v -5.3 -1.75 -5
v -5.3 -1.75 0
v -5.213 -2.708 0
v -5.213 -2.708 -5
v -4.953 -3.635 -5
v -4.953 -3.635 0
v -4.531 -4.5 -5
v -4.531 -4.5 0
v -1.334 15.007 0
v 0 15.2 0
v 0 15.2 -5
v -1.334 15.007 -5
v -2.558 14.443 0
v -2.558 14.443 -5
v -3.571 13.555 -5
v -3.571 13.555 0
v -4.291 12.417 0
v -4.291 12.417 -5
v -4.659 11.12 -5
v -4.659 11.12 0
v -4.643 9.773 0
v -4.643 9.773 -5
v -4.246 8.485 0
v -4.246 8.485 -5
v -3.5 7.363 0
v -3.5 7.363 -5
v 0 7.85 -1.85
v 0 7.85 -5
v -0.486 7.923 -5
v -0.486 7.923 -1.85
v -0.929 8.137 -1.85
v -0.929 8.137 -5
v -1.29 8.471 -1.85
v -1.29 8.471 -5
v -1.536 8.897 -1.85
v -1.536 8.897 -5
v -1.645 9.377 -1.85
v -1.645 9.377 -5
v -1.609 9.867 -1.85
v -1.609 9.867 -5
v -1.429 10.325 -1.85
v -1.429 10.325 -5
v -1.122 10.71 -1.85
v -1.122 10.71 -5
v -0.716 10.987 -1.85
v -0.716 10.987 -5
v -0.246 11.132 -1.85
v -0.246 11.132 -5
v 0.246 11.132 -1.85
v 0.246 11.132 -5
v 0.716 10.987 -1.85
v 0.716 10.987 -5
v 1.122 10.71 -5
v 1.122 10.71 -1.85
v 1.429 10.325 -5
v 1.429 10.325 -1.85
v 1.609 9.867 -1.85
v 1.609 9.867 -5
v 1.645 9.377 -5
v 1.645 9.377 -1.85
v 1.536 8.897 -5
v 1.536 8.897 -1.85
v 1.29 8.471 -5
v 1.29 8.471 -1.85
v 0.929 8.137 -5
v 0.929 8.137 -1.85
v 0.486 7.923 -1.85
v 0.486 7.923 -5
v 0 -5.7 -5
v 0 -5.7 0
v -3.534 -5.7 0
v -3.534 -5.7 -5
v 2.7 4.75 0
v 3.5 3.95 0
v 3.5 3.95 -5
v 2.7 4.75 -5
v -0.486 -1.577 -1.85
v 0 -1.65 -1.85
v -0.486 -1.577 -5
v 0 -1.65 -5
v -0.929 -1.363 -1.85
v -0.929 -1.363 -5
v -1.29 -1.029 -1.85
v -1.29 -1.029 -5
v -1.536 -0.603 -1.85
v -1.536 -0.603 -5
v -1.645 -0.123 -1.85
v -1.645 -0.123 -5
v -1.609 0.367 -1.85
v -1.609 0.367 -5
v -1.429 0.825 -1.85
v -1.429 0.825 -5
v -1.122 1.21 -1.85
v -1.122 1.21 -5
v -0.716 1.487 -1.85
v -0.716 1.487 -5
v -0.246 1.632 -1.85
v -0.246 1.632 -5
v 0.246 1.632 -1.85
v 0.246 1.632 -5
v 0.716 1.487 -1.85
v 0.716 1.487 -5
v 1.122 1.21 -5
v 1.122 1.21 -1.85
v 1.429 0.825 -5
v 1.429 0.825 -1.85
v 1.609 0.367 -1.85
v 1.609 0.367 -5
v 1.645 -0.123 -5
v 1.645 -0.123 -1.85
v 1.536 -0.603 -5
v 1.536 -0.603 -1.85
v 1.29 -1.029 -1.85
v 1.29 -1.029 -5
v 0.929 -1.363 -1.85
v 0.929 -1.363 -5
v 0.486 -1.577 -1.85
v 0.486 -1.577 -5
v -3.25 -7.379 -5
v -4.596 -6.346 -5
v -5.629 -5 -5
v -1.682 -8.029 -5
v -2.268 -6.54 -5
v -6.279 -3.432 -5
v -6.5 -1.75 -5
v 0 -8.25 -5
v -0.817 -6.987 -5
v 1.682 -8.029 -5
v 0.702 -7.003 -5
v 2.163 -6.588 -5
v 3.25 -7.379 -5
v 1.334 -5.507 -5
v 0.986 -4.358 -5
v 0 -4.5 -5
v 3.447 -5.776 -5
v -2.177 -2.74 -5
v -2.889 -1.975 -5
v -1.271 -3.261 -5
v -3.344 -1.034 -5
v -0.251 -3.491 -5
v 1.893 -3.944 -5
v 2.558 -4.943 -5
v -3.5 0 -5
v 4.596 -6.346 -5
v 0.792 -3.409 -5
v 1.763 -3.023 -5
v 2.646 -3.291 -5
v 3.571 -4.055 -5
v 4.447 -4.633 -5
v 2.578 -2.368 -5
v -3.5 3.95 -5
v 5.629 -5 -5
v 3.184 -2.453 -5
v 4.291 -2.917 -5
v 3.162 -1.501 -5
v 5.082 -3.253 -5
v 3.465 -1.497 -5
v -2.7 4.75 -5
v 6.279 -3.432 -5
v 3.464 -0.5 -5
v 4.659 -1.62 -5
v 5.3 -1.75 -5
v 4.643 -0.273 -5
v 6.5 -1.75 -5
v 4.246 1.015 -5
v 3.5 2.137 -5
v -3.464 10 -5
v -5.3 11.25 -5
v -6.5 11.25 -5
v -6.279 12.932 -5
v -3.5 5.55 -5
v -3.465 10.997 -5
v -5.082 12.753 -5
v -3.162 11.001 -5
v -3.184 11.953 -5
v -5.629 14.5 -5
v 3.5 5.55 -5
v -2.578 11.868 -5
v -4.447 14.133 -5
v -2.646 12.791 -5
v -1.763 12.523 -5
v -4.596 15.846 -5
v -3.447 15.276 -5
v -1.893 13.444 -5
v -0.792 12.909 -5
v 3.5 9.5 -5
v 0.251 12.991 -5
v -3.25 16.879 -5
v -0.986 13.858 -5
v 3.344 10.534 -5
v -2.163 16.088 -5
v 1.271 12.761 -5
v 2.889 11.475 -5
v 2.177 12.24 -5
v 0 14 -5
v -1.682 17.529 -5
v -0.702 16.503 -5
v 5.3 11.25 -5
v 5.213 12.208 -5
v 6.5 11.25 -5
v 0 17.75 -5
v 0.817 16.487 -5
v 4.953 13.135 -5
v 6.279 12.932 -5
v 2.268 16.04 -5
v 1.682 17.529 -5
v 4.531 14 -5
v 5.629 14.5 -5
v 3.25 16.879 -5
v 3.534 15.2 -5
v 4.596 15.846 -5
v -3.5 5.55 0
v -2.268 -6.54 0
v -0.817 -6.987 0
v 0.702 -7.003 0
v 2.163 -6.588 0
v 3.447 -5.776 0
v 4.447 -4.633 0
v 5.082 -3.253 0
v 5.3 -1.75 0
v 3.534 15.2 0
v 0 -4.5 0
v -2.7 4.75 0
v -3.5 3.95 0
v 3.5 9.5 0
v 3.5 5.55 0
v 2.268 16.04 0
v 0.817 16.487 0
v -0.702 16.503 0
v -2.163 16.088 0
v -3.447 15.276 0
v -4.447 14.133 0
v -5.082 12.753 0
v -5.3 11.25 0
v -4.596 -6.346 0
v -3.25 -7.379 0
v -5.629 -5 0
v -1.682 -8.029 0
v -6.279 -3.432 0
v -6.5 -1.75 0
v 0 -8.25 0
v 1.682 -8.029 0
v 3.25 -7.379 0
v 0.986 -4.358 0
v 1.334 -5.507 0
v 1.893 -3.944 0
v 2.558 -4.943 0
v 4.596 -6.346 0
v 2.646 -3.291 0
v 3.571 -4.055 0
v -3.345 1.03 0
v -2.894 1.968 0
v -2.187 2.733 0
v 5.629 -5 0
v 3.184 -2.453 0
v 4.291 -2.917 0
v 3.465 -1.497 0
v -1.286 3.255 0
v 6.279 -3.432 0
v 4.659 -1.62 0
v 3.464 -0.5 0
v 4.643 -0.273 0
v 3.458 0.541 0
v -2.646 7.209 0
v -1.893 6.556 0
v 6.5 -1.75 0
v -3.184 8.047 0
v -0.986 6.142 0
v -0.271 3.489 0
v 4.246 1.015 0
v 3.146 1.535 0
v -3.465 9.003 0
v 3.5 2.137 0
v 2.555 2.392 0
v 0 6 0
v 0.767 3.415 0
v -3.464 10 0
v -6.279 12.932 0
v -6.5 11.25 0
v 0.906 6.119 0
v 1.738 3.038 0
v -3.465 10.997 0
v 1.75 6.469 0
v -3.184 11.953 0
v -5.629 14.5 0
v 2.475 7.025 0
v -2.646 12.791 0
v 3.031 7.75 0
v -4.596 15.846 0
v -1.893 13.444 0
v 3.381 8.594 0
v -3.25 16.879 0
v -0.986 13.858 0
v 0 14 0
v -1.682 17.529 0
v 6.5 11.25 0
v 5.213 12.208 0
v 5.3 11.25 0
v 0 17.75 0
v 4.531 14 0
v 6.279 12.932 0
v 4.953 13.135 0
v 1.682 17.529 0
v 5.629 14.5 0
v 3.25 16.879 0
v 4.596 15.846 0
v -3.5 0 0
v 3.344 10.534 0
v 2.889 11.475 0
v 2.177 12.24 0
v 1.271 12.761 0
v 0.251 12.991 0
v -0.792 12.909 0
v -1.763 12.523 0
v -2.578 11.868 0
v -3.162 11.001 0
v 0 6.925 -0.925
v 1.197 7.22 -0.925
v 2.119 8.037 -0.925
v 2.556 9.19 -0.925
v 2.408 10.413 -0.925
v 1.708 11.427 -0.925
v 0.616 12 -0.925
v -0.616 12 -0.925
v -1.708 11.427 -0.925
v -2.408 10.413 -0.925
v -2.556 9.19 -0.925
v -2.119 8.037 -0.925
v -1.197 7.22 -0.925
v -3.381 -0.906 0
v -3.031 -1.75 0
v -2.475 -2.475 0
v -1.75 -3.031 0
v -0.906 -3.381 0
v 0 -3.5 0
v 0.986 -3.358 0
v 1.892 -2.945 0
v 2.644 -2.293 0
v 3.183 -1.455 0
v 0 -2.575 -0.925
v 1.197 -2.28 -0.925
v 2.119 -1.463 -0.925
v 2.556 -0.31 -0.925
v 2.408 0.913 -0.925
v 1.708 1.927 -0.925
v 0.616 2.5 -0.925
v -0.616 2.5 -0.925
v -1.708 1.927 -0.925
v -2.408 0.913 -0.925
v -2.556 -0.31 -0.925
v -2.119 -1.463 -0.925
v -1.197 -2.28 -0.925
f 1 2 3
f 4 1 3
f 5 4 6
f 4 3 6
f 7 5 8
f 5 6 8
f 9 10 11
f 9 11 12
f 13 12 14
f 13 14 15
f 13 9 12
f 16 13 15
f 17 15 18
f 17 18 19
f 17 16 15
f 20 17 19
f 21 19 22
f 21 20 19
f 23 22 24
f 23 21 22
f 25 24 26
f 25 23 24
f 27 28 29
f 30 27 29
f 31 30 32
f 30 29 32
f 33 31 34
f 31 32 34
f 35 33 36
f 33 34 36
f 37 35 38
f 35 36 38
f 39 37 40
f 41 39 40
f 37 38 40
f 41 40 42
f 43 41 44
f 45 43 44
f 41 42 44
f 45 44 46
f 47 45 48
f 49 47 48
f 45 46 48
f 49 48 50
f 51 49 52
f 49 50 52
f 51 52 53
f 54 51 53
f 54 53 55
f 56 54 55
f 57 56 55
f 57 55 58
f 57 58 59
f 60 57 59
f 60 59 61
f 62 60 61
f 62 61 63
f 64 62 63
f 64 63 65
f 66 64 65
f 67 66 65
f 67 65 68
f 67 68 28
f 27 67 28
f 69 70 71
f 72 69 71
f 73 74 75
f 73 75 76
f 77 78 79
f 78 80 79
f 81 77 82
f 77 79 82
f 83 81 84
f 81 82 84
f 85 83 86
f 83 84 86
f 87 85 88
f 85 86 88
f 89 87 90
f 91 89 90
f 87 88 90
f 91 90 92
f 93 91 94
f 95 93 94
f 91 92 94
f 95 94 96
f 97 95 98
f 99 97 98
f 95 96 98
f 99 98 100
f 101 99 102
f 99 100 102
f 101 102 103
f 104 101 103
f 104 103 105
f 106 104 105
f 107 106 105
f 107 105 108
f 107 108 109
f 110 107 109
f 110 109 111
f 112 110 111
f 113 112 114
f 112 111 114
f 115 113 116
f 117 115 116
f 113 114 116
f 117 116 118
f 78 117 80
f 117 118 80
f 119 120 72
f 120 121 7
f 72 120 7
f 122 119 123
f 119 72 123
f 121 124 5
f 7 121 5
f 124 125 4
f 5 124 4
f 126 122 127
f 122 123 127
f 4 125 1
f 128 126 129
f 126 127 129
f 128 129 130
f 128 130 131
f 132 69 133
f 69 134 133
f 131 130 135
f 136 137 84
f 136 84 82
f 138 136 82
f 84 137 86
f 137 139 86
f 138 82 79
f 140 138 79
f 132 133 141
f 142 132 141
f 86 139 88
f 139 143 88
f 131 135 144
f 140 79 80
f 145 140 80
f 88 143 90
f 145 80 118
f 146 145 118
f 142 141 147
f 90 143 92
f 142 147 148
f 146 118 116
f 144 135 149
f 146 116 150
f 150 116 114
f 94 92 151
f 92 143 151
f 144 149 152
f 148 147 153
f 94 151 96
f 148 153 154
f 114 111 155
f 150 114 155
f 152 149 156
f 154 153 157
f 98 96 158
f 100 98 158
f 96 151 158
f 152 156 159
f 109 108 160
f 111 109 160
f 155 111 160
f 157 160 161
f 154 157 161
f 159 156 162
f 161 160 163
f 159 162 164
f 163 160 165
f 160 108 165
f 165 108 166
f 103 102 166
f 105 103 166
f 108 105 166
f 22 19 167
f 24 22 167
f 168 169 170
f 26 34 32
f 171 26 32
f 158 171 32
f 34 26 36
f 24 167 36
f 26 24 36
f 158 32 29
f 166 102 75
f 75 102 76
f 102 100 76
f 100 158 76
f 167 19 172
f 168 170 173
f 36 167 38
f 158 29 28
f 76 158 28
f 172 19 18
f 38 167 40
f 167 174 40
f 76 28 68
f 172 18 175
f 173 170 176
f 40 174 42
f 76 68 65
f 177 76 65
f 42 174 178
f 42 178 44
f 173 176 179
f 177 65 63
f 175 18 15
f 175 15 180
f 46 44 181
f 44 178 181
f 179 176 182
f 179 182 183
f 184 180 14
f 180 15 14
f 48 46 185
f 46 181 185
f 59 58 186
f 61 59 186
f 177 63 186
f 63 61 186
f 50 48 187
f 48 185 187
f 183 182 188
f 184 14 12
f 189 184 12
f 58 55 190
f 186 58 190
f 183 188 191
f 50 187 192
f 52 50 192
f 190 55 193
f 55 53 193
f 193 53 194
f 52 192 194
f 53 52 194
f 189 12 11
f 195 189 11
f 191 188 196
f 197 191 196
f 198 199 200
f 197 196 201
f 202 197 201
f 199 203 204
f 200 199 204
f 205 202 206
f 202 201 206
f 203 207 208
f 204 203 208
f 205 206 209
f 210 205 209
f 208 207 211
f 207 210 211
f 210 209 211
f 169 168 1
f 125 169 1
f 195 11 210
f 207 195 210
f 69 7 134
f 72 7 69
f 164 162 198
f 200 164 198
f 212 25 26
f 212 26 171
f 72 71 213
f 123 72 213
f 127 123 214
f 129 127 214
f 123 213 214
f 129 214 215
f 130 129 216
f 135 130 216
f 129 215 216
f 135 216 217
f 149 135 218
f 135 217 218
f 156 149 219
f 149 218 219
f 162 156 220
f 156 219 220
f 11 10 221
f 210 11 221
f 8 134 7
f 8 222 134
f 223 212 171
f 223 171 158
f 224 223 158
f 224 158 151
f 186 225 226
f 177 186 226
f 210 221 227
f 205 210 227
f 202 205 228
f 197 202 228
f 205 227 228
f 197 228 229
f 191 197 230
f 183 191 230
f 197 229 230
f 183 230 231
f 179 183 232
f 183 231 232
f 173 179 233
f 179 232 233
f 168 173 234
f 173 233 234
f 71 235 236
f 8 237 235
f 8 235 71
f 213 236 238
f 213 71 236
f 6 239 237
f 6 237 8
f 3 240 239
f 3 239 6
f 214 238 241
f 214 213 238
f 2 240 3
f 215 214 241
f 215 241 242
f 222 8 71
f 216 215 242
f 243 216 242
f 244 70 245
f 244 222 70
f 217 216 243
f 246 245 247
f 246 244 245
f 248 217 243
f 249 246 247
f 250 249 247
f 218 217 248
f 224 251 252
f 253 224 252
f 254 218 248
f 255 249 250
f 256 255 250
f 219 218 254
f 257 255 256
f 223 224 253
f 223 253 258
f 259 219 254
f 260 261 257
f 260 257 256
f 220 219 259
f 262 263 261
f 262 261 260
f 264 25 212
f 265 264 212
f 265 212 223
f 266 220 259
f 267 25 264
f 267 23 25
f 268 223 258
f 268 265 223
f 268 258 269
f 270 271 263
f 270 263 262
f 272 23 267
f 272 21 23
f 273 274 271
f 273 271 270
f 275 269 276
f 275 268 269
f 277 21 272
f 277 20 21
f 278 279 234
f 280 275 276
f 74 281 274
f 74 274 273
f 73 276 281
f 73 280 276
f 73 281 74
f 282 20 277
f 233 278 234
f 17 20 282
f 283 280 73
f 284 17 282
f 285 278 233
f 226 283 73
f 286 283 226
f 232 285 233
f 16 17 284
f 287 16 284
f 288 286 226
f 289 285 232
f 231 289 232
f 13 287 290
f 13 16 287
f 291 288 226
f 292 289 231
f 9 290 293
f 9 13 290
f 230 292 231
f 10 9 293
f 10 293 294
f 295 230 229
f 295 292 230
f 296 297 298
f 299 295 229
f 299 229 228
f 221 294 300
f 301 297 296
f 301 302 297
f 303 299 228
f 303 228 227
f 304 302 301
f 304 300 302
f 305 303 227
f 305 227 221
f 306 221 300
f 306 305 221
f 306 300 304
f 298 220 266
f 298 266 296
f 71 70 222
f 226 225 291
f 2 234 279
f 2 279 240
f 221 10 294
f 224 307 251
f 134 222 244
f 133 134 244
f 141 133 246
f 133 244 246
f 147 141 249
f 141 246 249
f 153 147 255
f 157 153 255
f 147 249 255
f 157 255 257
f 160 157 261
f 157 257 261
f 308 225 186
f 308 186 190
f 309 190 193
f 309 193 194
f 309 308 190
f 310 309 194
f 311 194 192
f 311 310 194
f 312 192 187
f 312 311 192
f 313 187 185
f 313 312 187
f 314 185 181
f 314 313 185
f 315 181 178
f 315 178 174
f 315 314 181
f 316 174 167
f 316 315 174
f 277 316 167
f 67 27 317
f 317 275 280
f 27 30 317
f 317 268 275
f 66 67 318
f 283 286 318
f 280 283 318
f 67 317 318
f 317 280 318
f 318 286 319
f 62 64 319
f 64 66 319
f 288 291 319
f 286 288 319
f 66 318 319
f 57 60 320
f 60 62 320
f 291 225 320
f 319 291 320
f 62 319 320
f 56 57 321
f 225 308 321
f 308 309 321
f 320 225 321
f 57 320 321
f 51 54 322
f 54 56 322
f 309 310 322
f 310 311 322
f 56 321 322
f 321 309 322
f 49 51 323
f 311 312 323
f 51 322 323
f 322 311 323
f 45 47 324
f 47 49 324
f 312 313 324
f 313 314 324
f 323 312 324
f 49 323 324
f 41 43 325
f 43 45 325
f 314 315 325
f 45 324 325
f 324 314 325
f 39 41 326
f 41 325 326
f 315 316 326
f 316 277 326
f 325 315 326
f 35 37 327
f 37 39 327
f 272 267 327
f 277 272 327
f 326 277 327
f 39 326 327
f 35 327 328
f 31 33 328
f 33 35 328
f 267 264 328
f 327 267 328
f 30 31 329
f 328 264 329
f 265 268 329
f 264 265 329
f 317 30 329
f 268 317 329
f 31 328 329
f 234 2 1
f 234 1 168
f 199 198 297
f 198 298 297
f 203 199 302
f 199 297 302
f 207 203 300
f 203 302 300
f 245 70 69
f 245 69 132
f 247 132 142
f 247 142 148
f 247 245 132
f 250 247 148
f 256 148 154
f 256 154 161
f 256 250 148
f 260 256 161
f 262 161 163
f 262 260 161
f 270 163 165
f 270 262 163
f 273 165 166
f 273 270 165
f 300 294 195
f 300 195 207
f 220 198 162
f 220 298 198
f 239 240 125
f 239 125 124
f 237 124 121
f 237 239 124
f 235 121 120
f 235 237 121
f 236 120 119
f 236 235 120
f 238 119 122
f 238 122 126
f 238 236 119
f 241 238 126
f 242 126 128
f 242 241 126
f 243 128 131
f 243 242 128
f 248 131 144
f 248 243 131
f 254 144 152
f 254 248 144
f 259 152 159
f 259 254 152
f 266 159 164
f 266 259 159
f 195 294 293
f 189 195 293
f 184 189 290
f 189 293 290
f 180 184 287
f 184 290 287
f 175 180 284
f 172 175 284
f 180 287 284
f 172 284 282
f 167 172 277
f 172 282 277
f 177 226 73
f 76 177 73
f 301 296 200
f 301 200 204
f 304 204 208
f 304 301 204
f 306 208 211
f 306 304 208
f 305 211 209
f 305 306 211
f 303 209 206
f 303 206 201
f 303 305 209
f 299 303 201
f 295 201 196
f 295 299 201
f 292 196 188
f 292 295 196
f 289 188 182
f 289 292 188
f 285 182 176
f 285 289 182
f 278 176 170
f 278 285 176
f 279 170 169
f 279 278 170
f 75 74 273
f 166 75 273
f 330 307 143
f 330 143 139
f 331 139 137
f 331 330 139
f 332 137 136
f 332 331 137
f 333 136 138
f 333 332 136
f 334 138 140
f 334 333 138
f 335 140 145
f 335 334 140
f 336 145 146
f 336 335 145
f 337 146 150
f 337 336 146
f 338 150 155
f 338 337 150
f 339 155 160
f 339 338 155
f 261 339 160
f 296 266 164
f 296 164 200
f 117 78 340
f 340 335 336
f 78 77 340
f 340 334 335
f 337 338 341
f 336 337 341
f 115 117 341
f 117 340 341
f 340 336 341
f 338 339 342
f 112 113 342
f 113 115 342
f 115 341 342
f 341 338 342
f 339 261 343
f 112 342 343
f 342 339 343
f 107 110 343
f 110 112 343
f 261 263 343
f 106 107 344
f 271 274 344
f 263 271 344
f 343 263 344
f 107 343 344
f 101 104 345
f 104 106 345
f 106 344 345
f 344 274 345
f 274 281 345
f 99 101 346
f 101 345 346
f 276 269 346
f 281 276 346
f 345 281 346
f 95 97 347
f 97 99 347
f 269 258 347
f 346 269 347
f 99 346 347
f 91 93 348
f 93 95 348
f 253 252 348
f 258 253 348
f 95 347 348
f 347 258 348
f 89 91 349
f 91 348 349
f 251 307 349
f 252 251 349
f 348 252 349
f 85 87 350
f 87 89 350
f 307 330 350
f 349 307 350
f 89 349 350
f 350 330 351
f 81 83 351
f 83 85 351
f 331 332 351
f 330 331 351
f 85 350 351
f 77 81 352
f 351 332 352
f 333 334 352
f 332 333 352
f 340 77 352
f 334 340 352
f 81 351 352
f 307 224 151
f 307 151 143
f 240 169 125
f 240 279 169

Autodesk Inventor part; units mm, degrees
ref_plane "YZ Plane" through (0, 0, 0) normal (1, 0, 0) x (0, 1, 0)
ref_plane "XZ Plane" through (0, 0, 0) normal (0, 1, 0) x (-1, 0, 0)
ref_plane "XY Plane" through (0, 0, 0) normal (0, 0, 1) x (1, 0, 0)
sketch "Skizze1" plane through (0, 0, 0) normal (0, 0, 1) x (1, 0, 0)
  line L0 (0, -1.75) -> (0, 11.25) construction
  line L1 (6.5, -1.75) -> (6.5, 11.25)
  line L2 (-6.5, 11.25) -> (-6.5, -1.75)
  arc A0 (-6.5, -1.75) -> (6.5, -1.75) centre (0, -1.75) ccw
  arc A1 (6.5, 11.25) -> (-6.5, 11.25) centre (0, 11.25) ccw
  line L3 (0, 0) -> (0, 9.5) construction
  line L4 (5, -11) -> (-5, -11) construction
  line L5 (0, 0) -> (0, -11) construction
  line L6 (-8.5, 9.1711) -> (-8.5, -11) construction
  point P0 (0, 4.75)
  dimension "d0" = 13
  dimension "d1" = 13
  dimension "d14" = 9.5
  dimension "d17" = 0
  dimension "d26" = 11
  dimension "d27" = 10
  dimension "d28" = 9.25
  dimension "d29" = 8.5
  dimension "d30" = 8.5
extrude "Extrusion1" add sketch "Skizze1" against normal blind 5
hole "Bohrung2" at (0, 9.5, 0) at (0, 0, 0) direction (0, 0, -1) diameter 3.3 end through all countersink diameter 7 countersink angle 90
sketch "Skizze5" plane through (0, 0, 0) normal (0, 0, 1) x (1, 0, 0)
  circle A0 centre (0, 9.5) radius 3.5 projected
  circle A1 centre (0, 0) radius 3.5 projected
  line L0 (6.5, -1.75) -> (6.5, 11.25) projected
  arc A2 (6.5, 11.25) -> (-6.5, 11.25) centre (0, 11.25) ccw projected
  line L1 (-6.5, 11.25) -> (-6.5, -1.75) projected
  arc A3 (-6.5, -1.75) -> (6.5, -1.75) centre (0, -1.75) ccw projected
  arc A4 (5.3, 11.25) -> (-5.3, 11.25) centre (0, 11.25) ccw
  line L2 (5.3, 11.25) -> (5.3, -1.75)
  arc A5 (-5.3, -1.75) -> (5.3, -1.75) centre (0, -1.75) ccw
  line L3 (-5.3, -1.75) -> (-5.3, 11.25)
  arc A6 (0, 14) -> (-3.4641, 10) centre (0, 10.5) ccw
  arc A7 (0, 15.2) -> (-3.5, 7.3631) centre (0, 10.5) ccw
  line L4 (-3.5, 9.5) -> (-3.5, 0)
  line L5 (3.5, 9.5) -> (3.5, 0)
  circle A8 centre (0, 9.5) radius 3.5 projected
  circle A9 centre (0, 0) radius 3.5 projected
  line L6 (0, 23.6739) -> (0, -14.1739) construction
  arc A10 (0, -5.7) -> (3.5, 2.1369) centre (0, -1) ccw
  line L7 (0, -4.5) -> (-4.5307, -4.5)
  line L8 (0, -5.7) -> (-3.5338, -5.7)
  line L9 (0, 15.2) -> (3.5338, 15.2)
  line L10 (0, 14) -> (4.5307, 14)
  arc A11 (0, -4.5) -> (3.4641, -0.5) centre (0, -1) ccw
  point P0 (3.5, 2.6665)
  dimension "d47" = 1.2
  dimension "d48" = 1.2
  dimension "d50" = 1
  dimension "d60" = 3.5
  dimension "d61" = 1
  dimension "d62" = 1.2
  dimension "d63" = 3.5
extrude "Extrusion4" cut sketch "Skizze5" against normal through all contours A0 A6 L10 A4 L2 A5 L8 A10 L5 | L4 A1 A11 L7 A5 L3 A4 L9 A7
sketch "Skizze6" plane through (0, 0, 0) normal (0, 0, 1) x (1, 0, 0)
  line L0 (-3.5, 7.3631) -> (-3.5, 0) projected
  line L1 (3.5, 2.1369) -> (3.5, 9.5) projected
  circle A0 centre (0, 9.5) radius 1.65 projected
  circle A1 centre (0, 0) radius 1.65 projected
  line L2 (0, 0) -> (0, 9.5) construction
  line L3 (3.5, 4.75) -> (-3.5, 4.75) construction
  line L4 (3.5, 5.55) -> (2.7, 4.75)
  line L5 (3.5, 3.95) -> (2.7, 4.75)
  line L6 (-3.5, 5.55) -> (-2.7, 4.75)
  line L7 (-2.7, 4.75) -> (-3.5, 3.95)
  point P0 (0, 4.75)
  dimension "d64" = 0.8
extrude "Markierung" cut sketch "Skizze6" against normal through all contours L6 L7 L0 | L5 L4 L1
equation "\"d_Boden\" = 9.5"
equation "\"d_Vorne\" = 9"
equation "\"d_Arm\" = 1.2"
properties part number "Dribbler Slider v2" material "Gummi, Silikon"
